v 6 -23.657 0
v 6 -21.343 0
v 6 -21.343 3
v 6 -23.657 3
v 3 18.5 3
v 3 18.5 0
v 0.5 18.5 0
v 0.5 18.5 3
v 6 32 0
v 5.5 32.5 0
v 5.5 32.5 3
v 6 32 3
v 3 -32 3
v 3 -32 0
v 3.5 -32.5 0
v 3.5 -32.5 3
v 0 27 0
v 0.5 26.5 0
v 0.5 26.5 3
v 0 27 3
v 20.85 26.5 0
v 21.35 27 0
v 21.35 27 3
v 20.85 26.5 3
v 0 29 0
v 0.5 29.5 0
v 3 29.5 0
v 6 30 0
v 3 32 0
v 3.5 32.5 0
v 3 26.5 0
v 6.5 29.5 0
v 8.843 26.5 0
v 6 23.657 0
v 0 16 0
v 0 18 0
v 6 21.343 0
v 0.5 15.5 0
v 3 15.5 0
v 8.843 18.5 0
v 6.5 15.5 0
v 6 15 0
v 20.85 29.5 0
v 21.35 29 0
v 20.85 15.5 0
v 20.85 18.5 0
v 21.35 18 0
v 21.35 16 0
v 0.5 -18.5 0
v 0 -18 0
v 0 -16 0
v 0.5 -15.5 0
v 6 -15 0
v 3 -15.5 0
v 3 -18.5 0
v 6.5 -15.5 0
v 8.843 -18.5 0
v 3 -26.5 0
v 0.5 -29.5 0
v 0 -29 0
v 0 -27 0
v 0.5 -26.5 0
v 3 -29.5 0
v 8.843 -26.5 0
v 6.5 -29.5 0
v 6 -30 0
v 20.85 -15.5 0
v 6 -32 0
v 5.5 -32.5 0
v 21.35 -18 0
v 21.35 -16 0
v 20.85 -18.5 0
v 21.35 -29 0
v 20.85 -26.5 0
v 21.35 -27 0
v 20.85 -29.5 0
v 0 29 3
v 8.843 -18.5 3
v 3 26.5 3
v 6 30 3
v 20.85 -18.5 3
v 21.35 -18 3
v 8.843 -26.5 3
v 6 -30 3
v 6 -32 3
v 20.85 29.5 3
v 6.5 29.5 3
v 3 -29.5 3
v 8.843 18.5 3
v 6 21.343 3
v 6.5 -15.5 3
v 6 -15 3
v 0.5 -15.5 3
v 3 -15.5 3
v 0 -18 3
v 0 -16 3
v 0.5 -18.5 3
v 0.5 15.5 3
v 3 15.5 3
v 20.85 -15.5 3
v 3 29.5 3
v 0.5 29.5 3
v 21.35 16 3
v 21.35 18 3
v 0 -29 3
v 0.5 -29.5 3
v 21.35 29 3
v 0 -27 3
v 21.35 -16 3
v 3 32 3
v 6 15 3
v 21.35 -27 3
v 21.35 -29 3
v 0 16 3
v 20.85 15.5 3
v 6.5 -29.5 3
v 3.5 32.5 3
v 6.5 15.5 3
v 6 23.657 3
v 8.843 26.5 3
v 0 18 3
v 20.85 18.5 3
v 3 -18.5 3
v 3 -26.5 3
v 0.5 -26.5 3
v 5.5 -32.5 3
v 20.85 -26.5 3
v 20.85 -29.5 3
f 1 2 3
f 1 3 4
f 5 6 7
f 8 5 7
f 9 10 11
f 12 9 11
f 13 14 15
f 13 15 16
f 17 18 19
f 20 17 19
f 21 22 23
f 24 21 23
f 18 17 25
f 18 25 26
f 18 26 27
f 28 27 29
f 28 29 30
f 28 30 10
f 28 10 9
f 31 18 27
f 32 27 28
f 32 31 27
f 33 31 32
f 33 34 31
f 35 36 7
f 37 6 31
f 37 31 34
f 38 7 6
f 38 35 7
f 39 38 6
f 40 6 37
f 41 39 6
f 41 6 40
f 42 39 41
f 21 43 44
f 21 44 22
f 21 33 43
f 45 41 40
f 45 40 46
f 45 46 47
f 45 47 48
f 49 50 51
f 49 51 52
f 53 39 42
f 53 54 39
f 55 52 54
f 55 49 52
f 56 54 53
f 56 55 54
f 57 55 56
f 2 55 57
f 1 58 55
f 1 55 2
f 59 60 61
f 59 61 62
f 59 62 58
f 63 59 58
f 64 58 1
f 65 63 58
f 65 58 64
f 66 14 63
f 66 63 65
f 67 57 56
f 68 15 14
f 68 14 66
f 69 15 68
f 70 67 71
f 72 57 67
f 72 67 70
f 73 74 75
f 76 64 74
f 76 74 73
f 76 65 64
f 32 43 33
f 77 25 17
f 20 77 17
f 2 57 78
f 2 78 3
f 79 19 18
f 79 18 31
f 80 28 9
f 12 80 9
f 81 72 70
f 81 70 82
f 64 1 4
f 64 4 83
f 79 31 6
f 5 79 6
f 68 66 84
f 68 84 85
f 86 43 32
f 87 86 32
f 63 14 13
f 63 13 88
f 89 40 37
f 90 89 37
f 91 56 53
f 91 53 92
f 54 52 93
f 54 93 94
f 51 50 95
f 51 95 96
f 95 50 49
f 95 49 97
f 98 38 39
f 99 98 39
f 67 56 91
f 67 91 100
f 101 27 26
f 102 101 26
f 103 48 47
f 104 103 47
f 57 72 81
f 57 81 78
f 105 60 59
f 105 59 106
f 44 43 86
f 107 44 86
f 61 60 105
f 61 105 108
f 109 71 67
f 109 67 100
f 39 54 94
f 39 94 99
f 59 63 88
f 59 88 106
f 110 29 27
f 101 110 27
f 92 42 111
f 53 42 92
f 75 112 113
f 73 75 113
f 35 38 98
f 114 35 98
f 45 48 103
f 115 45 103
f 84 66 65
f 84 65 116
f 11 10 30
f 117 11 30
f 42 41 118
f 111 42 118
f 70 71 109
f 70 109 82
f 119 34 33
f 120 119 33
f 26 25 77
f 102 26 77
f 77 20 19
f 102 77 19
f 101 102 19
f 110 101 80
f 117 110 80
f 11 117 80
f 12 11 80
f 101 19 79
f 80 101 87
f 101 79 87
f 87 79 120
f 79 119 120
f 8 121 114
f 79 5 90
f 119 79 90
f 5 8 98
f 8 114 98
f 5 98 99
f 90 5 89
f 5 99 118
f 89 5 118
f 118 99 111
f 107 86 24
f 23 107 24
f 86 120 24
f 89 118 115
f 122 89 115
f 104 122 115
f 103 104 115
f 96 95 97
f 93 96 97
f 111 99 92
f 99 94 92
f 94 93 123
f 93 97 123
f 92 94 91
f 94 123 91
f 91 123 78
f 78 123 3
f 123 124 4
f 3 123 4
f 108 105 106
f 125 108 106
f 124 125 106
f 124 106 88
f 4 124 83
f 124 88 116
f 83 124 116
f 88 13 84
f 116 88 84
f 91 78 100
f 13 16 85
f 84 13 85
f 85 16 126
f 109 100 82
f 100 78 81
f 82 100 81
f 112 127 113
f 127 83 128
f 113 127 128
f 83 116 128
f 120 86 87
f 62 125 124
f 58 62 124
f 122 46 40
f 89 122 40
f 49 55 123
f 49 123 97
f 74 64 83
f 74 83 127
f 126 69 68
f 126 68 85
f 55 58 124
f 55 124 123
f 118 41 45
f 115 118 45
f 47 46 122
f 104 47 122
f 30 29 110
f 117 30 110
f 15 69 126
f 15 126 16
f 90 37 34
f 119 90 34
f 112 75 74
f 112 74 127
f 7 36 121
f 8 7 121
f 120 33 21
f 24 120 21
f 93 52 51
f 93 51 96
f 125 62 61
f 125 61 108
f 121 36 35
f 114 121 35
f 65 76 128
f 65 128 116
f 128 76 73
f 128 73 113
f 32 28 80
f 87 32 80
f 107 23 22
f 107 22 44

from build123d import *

# Parameters (mm, degrees)
F1_DEPTH = 3
F2_SIZE  = 0.5


with BuildPart() as f1:
    # F0 (on Top) → F1 (new body)
    with BuildSketch(Plane.XY):
        Polygon((6, 23.656854), (8.843146, 26.5), (21.35, 26.5), (21.35, 29.5), (6, 29.5), (6, 32.5), (3, 32.5), (3, 29.5), (0, 29.5), (0, 26.5), (3, 26.5), (3, 18.5), (0, 18.5), (0, 15.5), (3, 15.5), (3, 0), (6, 0), (6, 15.5), (21.35, 15.5), (21.35, 18.5), (8.843146, 18.5), (6, 21.343146), align=None)
    extrude(amount=F1_DEPTH)

    # F2
    f2_edges = [f1.edges().sort_by_distance(p)[0] for p in [
        (0, 29.5, 1.5),
        (0, 26.5, 1.5),
        (0, 18.5, 1.5),
        (0, 15.5, 1.5),
        (21.35, 15.5, 1.5),
        (21.35, 26.5, 1.5),
        (3, 32.5, 1.5),
        (6, 32.5, 1.5),
        (21.35, 29.5, 1.5),
        (21.35, 18.5, 1.5),
        (6, 15.5, 1.5),
        (6, 29.5, 1.5),
    ]]
    chamfer(f2_edges, length=F2_SIZE)

    # F3: F1 across face


with BuildPart() as f1_1:
    add(f1.part)
    add(f1.part.mirror(Plane(origin=(4.5, 0, 1.5), x_dir=(1, 0, 0), z_dir=(0, -1, 0))))


solid = f1_1.part
